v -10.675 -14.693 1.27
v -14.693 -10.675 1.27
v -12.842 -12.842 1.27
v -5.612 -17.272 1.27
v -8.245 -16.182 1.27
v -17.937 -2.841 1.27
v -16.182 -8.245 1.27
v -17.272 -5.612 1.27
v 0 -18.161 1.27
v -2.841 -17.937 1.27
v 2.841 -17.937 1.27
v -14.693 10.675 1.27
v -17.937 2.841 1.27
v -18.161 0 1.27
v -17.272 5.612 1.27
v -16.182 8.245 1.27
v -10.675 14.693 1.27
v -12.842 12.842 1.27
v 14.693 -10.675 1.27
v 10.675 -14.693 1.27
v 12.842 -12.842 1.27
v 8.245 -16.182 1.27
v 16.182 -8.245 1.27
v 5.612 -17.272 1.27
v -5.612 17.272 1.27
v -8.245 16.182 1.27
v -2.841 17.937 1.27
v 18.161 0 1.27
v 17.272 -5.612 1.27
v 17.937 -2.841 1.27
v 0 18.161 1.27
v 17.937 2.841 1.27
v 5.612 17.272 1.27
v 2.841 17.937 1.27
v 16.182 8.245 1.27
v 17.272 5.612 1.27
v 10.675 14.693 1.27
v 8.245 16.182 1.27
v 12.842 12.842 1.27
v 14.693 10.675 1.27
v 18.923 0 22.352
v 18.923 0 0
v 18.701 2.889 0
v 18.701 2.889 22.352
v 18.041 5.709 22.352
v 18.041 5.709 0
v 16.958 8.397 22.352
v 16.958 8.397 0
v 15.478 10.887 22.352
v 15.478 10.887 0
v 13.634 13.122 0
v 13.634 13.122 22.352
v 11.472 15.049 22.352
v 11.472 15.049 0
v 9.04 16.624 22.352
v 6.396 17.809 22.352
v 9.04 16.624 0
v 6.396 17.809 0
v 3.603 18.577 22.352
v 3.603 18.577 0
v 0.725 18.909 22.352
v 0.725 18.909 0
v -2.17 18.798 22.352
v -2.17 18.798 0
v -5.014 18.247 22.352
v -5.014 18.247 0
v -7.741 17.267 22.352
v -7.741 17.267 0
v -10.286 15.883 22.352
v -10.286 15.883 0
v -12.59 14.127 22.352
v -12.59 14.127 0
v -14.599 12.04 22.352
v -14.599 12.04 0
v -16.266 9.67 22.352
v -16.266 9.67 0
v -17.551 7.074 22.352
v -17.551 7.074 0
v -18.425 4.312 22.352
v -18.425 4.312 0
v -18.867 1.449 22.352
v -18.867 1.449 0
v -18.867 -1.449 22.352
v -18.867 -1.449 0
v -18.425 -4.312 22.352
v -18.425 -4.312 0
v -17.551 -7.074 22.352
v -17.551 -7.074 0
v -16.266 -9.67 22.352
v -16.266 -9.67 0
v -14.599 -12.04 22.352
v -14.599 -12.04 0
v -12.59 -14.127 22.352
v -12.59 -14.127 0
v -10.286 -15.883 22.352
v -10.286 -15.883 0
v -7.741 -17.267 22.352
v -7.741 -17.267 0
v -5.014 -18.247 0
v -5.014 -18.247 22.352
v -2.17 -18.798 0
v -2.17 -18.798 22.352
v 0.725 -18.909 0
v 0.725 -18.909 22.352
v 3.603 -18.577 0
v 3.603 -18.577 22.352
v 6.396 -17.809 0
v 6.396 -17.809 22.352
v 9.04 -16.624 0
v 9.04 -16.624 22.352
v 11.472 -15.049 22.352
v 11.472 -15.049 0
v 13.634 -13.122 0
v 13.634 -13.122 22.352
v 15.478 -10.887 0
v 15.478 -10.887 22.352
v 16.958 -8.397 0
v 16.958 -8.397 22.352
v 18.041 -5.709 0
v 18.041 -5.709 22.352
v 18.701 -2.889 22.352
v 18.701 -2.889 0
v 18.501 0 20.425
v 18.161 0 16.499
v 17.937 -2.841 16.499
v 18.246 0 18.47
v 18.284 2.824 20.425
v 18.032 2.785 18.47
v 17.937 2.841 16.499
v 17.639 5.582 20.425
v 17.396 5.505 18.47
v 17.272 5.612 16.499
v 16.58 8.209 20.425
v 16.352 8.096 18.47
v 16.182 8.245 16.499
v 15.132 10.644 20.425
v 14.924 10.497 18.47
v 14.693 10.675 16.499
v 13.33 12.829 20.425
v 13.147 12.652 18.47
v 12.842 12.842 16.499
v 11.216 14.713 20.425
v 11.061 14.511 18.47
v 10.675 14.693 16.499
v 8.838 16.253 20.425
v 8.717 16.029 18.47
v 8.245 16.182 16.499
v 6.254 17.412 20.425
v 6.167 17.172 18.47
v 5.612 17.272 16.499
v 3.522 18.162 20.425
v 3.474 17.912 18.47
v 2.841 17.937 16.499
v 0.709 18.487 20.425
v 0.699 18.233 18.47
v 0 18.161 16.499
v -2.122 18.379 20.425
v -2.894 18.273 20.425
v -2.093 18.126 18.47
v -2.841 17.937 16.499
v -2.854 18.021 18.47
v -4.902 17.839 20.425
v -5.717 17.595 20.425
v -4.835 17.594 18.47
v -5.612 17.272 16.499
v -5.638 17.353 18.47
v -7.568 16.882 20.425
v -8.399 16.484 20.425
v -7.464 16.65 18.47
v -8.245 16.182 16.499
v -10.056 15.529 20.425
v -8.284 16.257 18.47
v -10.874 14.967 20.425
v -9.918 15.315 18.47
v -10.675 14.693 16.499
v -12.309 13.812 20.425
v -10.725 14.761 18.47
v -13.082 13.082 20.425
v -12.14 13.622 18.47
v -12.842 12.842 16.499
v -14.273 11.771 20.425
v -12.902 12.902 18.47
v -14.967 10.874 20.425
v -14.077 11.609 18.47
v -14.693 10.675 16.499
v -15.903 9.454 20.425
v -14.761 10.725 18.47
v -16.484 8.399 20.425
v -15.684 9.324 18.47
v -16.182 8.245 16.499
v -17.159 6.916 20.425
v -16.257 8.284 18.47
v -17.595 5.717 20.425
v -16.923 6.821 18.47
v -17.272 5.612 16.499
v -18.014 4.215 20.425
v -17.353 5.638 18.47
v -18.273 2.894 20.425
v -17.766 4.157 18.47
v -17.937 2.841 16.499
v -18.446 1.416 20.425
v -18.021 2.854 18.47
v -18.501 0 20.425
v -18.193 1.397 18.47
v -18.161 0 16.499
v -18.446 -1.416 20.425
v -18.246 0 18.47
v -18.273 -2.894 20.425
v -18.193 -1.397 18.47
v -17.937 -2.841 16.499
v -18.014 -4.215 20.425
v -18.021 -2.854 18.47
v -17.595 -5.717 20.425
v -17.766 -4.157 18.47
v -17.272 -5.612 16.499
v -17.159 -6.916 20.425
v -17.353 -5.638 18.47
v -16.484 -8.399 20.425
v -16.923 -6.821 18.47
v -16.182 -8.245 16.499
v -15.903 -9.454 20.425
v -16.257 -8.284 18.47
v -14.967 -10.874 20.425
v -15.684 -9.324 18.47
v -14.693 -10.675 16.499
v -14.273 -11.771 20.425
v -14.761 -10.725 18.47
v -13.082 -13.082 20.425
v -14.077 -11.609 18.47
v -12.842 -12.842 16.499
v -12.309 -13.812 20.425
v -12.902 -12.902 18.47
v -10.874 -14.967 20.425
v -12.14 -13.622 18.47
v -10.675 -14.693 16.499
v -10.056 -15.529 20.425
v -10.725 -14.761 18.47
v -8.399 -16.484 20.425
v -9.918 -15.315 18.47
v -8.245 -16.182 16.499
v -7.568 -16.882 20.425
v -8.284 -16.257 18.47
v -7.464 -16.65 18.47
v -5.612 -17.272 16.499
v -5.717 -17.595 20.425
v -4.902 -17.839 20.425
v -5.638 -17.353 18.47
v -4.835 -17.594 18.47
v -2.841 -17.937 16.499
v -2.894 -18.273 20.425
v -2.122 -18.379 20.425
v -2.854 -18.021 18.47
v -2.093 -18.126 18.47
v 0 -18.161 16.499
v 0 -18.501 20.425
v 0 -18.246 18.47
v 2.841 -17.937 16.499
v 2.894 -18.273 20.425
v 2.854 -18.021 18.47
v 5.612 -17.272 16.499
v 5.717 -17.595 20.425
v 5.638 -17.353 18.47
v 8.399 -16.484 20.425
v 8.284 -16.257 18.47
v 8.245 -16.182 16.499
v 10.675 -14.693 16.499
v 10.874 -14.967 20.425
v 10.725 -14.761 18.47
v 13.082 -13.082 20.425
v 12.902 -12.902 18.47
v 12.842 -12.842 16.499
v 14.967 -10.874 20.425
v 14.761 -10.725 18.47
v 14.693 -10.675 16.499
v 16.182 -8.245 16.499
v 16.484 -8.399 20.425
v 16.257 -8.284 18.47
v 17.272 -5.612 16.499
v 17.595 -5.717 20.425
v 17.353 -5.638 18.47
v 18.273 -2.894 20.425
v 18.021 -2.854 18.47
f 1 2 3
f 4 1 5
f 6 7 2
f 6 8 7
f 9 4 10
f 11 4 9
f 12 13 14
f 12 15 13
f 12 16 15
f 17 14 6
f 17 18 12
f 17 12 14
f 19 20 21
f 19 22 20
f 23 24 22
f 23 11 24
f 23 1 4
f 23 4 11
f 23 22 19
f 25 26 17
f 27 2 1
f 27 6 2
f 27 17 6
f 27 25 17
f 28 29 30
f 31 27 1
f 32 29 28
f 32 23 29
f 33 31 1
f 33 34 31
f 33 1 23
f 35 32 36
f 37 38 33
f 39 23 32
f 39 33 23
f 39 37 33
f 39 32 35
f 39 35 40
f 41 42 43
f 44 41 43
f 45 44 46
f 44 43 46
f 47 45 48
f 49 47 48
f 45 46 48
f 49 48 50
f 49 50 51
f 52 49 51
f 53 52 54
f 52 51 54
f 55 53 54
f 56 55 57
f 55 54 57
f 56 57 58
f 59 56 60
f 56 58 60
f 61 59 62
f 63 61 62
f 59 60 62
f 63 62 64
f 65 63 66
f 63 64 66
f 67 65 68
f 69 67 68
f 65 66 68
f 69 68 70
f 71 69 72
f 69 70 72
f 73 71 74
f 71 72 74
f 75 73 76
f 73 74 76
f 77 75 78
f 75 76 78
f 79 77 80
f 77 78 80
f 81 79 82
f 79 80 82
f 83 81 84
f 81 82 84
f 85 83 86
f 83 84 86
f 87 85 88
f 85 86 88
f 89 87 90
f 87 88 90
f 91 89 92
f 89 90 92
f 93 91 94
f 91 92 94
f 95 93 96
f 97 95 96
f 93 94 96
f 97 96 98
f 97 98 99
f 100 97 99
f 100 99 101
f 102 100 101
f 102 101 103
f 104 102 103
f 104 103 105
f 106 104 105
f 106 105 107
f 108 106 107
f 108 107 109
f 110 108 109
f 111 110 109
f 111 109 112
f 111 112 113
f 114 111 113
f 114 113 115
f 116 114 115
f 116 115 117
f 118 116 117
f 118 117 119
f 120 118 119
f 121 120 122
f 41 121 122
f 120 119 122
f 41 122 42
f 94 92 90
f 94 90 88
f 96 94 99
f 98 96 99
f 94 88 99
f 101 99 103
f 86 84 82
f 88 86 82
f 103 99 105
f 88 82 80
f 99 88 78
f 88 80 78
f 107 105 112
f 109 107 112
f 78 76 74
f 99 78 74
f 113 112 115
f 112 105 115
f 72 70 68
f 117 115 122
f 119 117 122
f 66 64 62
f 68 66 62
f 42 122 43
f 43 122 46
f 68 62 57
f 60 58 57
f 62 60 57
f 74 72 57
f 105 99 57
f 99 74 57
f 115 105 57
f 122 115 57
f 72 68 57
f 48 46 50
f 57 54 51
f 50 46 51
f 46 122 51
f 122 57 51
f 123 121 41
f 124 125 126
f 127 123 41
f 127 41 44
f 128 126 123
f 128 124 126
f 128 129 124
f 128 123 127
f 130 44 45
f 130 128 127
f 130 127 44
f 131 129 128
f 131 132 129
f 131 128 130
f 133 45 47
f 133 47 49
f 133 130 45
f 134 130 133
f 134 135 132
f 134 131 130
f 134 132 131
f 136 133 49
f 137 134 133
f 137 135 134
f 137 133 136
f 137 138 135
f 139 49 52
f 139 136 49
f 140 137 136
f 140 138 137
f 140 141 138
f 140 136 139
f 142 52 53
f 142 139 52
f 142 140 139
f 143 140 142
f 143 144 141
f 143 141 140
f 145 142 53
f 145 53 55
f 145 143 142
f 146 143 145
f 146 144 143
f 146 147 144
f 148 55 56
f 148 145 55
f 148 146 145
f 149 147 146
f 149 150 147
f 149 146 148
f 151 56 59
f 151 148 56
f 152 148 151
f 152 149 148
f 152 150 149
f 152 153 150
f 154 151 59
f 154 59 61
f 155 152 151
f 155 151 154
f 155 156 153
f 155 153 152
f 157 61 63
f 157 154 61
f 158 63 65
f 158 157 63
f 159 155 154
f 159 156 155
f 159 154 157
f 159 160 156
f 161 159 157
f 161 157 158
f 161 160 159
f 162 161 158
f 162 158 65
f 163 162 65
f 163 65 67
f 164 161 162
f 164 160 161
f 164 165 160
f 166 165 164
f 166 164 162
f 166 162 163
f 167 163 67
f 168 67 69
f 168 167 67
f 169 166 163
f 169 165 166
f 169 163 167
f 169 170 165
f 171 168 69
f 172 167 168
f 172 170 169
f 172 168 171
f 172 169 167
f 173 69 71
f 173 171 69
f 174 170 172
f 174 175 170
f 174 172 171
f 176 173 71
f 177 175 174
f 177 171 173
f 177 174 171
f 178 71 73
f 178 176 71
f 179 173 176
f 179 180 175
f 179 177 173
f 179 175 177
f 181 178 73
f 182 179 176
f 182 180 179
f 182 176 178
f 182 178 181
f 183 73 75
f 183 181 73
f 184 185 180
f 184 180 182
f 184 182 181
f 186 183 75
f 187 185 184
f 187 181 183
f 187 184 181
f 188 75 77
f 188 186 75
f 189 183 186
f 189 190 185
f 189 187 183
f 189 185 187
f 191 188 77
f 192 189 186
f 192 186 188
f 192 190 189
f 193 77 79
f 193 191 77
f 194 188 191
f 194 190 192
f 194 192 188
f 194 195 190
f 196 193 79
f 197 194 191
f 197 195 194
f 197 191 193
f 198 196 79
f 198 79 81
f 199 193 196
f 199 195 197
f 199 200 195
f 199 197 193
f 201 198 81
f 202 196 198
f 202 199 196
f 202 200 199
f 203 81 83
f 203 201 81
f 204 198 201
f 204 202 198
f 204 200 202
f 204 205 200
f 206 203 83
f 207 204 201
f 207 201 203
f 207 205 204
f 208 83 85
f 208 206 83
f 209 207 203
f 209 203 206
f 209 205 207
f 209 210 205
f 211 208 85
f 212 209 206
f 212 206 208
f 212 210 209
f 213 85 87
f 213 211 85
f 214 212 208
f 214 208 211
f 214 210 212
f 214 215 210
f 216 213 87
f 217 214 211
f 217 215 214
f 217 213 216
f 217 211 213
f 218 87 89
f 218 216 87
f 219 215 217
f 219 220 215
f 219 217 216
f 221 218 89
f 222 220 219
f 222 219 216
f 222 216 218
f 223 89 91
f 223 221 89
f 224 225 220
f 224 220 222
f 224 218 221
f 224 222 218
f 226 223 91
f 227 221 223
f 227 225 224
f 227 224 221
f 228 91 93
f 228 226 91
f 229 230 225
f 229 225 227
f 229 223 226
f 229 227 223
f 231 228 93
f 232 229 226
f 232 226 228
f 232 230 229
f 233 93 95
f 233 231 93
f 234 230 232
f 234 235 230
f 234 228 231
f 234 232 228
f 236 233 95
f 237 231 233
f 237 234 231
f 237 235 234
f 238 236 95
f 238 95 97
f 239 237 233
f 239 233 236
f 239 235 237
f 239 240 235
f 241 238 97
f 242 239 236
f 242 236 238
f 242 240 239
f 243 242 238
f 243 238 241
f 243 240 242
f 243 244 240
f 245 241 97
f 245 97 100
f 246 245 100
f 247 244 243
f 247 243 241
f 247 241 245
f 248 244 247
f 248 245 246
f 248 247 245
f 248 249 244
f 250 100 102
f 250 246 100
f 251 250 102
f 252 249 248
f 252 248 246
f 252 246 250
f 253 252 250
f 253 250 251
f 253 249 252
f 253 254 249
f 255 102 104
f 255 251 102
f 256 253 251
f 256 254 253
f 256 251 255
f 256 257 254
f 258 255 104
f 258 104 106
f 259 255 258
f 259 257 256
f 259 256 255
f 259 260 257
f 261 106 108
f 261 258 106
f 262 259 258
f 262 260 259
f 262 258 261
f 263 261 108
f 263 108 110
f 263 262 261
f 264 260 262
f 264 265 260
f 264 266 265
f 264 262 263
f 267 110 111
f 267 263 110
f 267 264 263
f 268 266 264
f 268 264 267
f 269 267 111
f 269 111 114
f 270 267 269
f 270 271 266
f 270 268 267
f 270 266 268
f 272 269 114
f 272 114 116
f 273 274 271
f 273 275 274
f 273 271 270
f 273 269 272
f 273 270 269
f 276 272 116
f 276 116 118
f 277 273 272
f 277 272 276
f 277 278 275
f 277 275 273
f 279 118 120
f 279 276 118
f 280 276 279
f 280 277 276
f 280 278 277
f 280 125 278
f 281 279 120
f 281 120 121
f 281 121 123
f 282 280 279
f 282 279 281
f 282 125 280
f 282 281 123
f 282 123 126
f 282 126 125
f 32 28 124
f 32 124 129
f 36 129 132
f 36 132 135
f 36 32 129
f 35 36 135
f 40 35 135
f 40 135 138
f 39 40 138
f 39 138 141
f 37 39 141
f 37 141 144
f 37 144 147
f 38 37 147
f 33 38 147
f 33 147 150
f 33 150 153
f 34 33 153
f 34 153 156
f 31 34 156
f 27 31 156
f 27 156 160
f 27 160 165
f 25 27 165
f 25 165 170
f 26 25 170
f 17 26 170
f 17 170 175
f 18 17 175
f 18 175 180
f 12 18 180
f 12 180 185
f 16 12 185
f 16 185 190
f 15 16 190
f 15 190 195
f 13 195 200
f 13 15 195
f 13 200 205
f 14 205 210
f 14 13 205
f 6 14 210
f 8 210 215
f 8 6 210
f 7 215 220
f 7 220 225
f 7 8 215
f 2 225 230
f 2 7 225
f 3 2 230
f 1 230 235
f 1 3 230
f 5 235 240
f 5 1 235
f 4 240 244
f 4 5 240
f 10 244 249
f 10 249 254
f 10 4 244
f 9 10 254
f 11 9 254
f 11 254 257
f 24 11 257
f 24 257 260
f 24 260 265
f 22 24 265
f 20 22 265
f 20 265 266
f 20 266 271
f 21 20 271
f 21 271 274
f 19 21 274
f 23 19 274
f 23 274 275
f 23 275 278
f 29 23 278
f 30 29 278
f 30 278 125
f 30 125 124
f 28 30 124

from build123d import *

# Parameters (mm, degrees)
F0_R     = 18.923
F0_R_2   = 18.161
F1_DEPTH = 22.352
F2_R     = 18.8764388906
F3_DEPTH = 1.27


# Not quite as in the source:
# - a fillet or chamfer that OpenCascade refuses, or shapes differently, is made with other operations: its cross-section is extruded or revolved along the edge and cut away or added


with BuildPart() as f1:
    # F0 (on Top) → F1 (new body)
    with BuildSketch(Plane.XY):
        Circle(F0_R)
        Circle(F0_R_2, mode=Mode.SUBTRACT)
    extrude(amount=F1_DEPTH)

    # F2 (on Top) → F3 (join)
    with BuildSketch(Plane.XY):
        Circle(F2_R)
    extrude(amount=F3_DEPTH)

    # F4: fillet of radius 22.86 on 1 edges, made by hand

    # F4_s1 → F4_t2 (revolve, cut)
    with BuildSketch(Plane.XZ):
        with BuildLine():
            ThreePointArc((18.923, 22.352), (18.3523004343, 19.4501802499), (18.161, 16.4989669401))
            Line((18.161, 16.4989669401), (18.161, 22.352))
            Line((18.161, 22.352), (18.923, 22.352))
        make_face()
    revolve(axis=Axis((0, 0, 22.352), (0, 0, 1)), mode=Mode.SUBTRACT)


solid = f1.part
